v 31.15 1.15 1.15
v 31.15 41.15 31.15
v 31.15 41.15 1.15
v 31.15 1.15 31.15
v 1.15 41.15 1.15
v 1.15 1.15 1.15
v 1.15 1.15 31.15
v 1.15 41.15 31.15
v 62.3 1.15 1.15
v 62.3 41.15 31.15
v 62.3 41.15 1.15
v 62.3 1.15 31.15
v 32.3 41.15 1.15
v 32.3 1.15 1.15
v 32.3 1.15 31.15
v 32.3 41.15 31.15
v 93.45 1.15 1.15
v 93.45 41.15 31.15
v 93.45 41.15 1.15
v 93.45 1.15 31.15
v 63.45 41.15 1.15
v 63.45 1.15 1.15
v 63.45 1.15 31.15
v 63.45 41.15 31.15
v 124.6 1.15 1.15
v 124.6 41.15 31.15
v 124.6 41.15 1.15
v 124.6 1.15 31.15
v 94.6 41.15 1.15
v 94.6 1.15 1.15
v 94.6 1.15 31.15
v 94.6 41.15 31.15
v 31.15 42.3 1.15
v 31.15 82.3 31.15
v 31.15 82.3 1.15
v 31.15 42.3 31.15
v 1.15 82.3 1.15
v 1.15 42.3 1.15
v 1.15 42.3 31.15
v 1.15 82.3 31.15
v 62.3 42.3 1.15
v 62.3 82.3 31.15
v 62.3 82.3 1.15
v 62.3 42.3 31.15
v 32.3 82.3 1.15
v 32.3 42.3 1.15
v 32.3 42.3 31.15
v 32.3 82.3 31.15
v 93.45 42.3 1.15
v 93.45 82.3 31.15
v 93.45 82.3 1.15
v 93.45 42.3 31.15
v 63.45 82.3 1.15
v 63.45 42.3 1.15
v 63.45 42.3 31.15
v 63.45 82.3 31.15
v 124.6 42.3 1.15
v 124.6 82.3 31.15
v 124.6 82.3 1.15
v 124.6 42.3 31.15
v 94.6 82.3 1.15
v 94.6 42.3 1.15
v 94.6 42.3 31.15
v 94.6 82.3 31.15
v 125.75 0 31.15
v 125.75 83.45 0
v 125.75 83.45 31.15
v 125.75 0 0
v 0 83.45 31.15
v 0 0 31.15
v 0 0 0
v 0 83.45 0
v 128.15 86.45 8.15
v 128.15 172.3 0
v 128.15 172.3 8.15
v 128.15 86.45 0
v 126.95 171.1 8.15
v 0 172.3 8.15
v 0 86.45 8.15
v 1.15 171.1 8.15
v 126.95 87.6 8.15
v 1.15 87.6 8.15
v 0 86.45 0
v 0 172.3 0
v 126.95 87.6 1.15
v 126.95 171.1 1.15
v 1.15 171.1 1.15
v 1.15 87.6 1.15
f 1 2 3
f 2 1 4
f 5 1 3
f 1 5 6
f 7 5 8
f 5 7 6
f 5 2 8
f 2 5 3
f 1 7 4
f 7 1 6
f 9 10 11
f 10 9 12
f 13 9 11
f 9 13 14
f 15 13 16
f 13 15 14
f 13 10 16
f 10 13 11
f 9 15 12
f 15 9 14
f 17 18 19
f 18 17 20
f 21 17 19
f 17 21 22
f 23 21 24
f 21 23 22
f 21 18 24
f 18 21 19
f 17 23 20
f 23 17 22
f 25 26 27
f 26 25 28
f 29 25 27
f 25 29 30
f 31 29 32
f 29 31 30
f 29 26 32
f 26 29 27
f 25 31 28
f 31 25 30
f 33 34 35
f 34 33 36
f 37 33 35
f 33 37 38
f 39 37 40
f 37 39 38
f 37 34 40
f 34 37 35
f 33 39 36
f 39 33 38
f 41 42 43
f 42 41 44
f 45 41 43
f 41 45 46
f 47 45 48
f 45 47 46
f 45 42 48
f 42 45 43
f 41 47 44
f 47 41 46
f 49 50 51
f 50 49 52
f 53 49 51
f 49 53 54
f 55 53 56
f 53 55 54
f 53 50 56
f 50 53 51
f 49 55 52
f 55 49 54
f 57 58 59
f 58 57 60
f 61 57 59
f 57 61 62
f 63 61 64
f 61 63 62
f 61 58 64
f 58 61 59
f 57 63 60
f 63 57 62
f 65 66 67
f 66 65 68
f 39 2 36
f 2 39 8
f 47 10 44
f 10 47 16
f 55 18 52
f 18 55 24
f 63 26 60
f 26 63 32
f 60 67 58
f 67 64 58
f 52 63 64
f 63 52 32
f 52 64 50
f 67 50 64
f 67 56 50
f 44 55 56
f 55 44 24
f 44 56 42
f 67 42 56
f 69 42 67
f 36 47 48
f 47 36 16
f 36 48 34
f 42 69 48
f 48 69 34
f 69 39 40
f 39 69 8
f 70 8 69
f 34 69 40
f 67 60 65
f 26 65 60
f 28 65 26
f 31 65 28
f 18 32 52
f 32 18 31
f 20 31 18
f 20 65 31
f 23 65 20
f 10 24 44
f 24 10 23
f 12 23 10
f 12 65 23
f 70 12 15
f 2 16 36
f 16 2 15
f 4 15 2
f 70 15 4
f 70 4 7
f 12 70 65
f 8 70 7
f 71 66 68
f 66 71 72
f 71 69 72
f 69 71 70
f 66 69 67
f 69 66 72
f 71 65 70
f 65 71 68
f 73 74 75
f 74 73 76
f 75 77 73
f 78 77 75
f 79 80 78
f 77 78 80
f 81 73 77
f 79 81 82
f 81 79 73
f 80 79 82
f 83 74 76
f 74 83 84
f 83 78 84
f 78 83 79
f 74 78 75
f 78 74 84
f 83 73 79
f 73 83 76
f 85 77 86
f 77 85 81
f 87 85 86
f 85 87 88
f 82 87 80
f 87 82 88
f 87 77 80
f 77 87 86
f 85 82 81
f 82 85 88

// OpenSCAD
/* [Global] */


// Whether or not to generate the box
generate_box="yes"; //[yes, no]

// Whether or not to generate the lid
generate_lid="yes"; //[yes, no]

showlid = generate_lid=="yes"? true : false;

showbox = generate_box=="yes"? true : false;

Type_of_Lid = "Standard";//[Standard, Sliding]




// Size of compartments, X
compx = 30;	


// Size of compartments, Y
compy = 40;	


// Width of wall, Make slightly larger then n*nozzle diameter. i.e. 1.15 for a 0.5 nozzle, should give a 2-pass thick wall
wall = 1.15;


// Number of compartments, X
nox = 4;


// Number of compartments, Y
noy = 2;



// Depth of compartments
deep = 30;	





// Tolerance around lid.  If it's too tight, increase this. If it's too loose, decrease it. 0.15 recommended for sliding lid
tolerance=.05;



// This is how far away from the box to print the lid
lidoffset=3;		


// How far the lid goes down the sides of the box. Only applies to Standard lid
lid_drop=7;
lidheight=lid_drop+wall;

//Adds a divit to sliding lid to make opening easer, no effect on standard lid
Thumb_Divit="yes"; //[yes, no]

includethumbhole = Thumb_Divit =="no"? false : true;


//Add a coin slot above every compartment
Coin_Slot="no"; //[yes, no]

includecoinslot=Coin_Slot == "no"? false: true;


//Size of Coin slot in X direction, default is slot thickness for United States Coins. Reverse X and Y to swap direction of slot
coinx=2.5;	
//Size of Coin slot in Y direction, default is slot width for United States Coins. Reverse X and Y to swap direction of slot
coiny=26;	



/* [Hidden] */

lidtype = Type_of_Lid == "Standard"? 0 : 1;	// 0=Flat lid.  Use "1" for lid that slides off in the x direction



				// Z tolerance can be tweaked separately, to make the top of the sliding lid
				// be flush with the top of the box itself.  Default is zero.  Warning: this also
				// adds wiggle room to the lid.
                //Hidden from customizer, because more likely to mess up the box then help it.
ztolerance=0;

////////////////////
//start of objects
////////////////////

totalheight = deep + (lidtype*wall);
thumbrad = min(20,noy*(compy+wall)/3);

if (showbox) {
difference() {
	cube ( size = [nox * (compx + wall) + wall, noy * (compy + wall) + wall, (totalheight + wall)], center = false);


	for ( ybox = [ 0 : noy - 1])
		{
             for( xbox = [ 0 : nox - 1])
			{
			translate([ xbox * ( compx + wall ) + wall, ybox * ( compy + wall ) + wall, wall])
			cube ( size = [ compx, compy, totalheight+1 ]);
			}
		}
	if (lidtype==1) {
			translate ([0,wall/2,deep+wall]) 
			polyhedron ( points = [   
							[0,0,0], 
							[0,noy*(compy+wall),0], 
							[nox*(compx+wall)+wall/2,0,0], 
							[nox*(compx+wall)+wall/2,noy*(compy+wall),0],
							[0,wall/2,wall], 
							[0,noy*(compy+wall)-wall/2,wall], 
							[nox*(compx+wall)+wall/2,wall/2,wall], 
							[nox*(compx+wall)+wall/2,noy*(compy+wall)-wall/2,wall]
							],
						faces = [ 
							[0,2,1], [1,2,3], [4,5,6], [5,7,6]	,		// top and bottom
							[0,4,2], [4,6,2], [5,3,7], [5,1,3]	,		// angled sides
							[0,1,4], [1,5,4], [2,6,3], [3,6,7]			// trapezoidal ends
							]);
			translate ([0,wall/2,deep+wall-ztolerance])
			cube (size=[nox*(compx+wall)+wall/2,noy*(compy+wall),ztolerance],center=false);
			}

	}
}

if (showlid) {
translate ([0,noy*(compy+wall)+wall+lidoffset,0])
difference () { union () {	// for including coin slot
	if (lidtype==1) { 
		difference () {
		polyhedron ( points = [   
						[0,0,0], 
						[0,noy*(compy+wall)-2*tolerance,0], 
						[nox*(compx+wall)-tolerance+wall/2,0,0], 
						[nox*(compx+wall)-tolerance+wall/2,noy*(compy+wall)-2*tolerance,0],
						[0,wall/2,wall], 
						[0,noy*(compy+wall)-wall/2-2*tolerance,wall], 
						[nox*(compx+wall)-tolerance+wall/2,wall/2,wall], 
						[nox*(compx+wall)-tolerance+wall/2,noy*(compy+wall)-wall/2-2*tolerance,wall]
						],
					faces = [ 
						[0,2,1], [1,2,3], [4,5,6], [5,7,6]	,		// top and bottom
						[0,4,2], [4,6,2], [5,3,7], [5,1,3]	,		// angled sides
						[0,1,4], [1,5,4], [2,6,3], [3,6,7]			// trapezoidal ends
						]);
		// Thumb hole
		if (includethumbhole==true) {
			intersection () {
			translate ([min(8,nox*(compx+wall)/8),(noy*(compy+wall))/2,thumbrad+wall/2]) sphere (r=thumbrad, center=true, $fn=60);
			translate ([min(8,nox*(compx+wall)/8),0,0]) cube (size=[20,(noy*(compy+wall)),20], center=false);
		}
	}

		}
	} else {

	difference() {
	cube ( size = [nox * (compx + wall) + 3 * wall + 2* tolerance, noy * (compy + wall) + 3 * wall + 2*tolerance, lidheight], center = false);

	translate ([wall,wall,wall])
	cube ( size = [nox * (compx + wall) +wall+tolerance, noy * (compy + wall) + wall + tolerance, lidheight+1], center = false);
	}
} // if lidtype
} // union
if (includecoinslot==true) {
	for ( yslot = [ 0 : noy - 1])
		{
             for( xslot = [ 0 : nox - 1])
			{
			translate([ xslot * ( compx + wall ) + (2-lidtype)*wall + (compx-coinx)/2, yslot * ( compy + wall ) + wall*(2-3*lidtype/2) + (compy-coiny)/2, 0])
			cube ( size = [ coinx, coiny, wall ]);
			}
		}
	}
} //difference
} // if showlid



